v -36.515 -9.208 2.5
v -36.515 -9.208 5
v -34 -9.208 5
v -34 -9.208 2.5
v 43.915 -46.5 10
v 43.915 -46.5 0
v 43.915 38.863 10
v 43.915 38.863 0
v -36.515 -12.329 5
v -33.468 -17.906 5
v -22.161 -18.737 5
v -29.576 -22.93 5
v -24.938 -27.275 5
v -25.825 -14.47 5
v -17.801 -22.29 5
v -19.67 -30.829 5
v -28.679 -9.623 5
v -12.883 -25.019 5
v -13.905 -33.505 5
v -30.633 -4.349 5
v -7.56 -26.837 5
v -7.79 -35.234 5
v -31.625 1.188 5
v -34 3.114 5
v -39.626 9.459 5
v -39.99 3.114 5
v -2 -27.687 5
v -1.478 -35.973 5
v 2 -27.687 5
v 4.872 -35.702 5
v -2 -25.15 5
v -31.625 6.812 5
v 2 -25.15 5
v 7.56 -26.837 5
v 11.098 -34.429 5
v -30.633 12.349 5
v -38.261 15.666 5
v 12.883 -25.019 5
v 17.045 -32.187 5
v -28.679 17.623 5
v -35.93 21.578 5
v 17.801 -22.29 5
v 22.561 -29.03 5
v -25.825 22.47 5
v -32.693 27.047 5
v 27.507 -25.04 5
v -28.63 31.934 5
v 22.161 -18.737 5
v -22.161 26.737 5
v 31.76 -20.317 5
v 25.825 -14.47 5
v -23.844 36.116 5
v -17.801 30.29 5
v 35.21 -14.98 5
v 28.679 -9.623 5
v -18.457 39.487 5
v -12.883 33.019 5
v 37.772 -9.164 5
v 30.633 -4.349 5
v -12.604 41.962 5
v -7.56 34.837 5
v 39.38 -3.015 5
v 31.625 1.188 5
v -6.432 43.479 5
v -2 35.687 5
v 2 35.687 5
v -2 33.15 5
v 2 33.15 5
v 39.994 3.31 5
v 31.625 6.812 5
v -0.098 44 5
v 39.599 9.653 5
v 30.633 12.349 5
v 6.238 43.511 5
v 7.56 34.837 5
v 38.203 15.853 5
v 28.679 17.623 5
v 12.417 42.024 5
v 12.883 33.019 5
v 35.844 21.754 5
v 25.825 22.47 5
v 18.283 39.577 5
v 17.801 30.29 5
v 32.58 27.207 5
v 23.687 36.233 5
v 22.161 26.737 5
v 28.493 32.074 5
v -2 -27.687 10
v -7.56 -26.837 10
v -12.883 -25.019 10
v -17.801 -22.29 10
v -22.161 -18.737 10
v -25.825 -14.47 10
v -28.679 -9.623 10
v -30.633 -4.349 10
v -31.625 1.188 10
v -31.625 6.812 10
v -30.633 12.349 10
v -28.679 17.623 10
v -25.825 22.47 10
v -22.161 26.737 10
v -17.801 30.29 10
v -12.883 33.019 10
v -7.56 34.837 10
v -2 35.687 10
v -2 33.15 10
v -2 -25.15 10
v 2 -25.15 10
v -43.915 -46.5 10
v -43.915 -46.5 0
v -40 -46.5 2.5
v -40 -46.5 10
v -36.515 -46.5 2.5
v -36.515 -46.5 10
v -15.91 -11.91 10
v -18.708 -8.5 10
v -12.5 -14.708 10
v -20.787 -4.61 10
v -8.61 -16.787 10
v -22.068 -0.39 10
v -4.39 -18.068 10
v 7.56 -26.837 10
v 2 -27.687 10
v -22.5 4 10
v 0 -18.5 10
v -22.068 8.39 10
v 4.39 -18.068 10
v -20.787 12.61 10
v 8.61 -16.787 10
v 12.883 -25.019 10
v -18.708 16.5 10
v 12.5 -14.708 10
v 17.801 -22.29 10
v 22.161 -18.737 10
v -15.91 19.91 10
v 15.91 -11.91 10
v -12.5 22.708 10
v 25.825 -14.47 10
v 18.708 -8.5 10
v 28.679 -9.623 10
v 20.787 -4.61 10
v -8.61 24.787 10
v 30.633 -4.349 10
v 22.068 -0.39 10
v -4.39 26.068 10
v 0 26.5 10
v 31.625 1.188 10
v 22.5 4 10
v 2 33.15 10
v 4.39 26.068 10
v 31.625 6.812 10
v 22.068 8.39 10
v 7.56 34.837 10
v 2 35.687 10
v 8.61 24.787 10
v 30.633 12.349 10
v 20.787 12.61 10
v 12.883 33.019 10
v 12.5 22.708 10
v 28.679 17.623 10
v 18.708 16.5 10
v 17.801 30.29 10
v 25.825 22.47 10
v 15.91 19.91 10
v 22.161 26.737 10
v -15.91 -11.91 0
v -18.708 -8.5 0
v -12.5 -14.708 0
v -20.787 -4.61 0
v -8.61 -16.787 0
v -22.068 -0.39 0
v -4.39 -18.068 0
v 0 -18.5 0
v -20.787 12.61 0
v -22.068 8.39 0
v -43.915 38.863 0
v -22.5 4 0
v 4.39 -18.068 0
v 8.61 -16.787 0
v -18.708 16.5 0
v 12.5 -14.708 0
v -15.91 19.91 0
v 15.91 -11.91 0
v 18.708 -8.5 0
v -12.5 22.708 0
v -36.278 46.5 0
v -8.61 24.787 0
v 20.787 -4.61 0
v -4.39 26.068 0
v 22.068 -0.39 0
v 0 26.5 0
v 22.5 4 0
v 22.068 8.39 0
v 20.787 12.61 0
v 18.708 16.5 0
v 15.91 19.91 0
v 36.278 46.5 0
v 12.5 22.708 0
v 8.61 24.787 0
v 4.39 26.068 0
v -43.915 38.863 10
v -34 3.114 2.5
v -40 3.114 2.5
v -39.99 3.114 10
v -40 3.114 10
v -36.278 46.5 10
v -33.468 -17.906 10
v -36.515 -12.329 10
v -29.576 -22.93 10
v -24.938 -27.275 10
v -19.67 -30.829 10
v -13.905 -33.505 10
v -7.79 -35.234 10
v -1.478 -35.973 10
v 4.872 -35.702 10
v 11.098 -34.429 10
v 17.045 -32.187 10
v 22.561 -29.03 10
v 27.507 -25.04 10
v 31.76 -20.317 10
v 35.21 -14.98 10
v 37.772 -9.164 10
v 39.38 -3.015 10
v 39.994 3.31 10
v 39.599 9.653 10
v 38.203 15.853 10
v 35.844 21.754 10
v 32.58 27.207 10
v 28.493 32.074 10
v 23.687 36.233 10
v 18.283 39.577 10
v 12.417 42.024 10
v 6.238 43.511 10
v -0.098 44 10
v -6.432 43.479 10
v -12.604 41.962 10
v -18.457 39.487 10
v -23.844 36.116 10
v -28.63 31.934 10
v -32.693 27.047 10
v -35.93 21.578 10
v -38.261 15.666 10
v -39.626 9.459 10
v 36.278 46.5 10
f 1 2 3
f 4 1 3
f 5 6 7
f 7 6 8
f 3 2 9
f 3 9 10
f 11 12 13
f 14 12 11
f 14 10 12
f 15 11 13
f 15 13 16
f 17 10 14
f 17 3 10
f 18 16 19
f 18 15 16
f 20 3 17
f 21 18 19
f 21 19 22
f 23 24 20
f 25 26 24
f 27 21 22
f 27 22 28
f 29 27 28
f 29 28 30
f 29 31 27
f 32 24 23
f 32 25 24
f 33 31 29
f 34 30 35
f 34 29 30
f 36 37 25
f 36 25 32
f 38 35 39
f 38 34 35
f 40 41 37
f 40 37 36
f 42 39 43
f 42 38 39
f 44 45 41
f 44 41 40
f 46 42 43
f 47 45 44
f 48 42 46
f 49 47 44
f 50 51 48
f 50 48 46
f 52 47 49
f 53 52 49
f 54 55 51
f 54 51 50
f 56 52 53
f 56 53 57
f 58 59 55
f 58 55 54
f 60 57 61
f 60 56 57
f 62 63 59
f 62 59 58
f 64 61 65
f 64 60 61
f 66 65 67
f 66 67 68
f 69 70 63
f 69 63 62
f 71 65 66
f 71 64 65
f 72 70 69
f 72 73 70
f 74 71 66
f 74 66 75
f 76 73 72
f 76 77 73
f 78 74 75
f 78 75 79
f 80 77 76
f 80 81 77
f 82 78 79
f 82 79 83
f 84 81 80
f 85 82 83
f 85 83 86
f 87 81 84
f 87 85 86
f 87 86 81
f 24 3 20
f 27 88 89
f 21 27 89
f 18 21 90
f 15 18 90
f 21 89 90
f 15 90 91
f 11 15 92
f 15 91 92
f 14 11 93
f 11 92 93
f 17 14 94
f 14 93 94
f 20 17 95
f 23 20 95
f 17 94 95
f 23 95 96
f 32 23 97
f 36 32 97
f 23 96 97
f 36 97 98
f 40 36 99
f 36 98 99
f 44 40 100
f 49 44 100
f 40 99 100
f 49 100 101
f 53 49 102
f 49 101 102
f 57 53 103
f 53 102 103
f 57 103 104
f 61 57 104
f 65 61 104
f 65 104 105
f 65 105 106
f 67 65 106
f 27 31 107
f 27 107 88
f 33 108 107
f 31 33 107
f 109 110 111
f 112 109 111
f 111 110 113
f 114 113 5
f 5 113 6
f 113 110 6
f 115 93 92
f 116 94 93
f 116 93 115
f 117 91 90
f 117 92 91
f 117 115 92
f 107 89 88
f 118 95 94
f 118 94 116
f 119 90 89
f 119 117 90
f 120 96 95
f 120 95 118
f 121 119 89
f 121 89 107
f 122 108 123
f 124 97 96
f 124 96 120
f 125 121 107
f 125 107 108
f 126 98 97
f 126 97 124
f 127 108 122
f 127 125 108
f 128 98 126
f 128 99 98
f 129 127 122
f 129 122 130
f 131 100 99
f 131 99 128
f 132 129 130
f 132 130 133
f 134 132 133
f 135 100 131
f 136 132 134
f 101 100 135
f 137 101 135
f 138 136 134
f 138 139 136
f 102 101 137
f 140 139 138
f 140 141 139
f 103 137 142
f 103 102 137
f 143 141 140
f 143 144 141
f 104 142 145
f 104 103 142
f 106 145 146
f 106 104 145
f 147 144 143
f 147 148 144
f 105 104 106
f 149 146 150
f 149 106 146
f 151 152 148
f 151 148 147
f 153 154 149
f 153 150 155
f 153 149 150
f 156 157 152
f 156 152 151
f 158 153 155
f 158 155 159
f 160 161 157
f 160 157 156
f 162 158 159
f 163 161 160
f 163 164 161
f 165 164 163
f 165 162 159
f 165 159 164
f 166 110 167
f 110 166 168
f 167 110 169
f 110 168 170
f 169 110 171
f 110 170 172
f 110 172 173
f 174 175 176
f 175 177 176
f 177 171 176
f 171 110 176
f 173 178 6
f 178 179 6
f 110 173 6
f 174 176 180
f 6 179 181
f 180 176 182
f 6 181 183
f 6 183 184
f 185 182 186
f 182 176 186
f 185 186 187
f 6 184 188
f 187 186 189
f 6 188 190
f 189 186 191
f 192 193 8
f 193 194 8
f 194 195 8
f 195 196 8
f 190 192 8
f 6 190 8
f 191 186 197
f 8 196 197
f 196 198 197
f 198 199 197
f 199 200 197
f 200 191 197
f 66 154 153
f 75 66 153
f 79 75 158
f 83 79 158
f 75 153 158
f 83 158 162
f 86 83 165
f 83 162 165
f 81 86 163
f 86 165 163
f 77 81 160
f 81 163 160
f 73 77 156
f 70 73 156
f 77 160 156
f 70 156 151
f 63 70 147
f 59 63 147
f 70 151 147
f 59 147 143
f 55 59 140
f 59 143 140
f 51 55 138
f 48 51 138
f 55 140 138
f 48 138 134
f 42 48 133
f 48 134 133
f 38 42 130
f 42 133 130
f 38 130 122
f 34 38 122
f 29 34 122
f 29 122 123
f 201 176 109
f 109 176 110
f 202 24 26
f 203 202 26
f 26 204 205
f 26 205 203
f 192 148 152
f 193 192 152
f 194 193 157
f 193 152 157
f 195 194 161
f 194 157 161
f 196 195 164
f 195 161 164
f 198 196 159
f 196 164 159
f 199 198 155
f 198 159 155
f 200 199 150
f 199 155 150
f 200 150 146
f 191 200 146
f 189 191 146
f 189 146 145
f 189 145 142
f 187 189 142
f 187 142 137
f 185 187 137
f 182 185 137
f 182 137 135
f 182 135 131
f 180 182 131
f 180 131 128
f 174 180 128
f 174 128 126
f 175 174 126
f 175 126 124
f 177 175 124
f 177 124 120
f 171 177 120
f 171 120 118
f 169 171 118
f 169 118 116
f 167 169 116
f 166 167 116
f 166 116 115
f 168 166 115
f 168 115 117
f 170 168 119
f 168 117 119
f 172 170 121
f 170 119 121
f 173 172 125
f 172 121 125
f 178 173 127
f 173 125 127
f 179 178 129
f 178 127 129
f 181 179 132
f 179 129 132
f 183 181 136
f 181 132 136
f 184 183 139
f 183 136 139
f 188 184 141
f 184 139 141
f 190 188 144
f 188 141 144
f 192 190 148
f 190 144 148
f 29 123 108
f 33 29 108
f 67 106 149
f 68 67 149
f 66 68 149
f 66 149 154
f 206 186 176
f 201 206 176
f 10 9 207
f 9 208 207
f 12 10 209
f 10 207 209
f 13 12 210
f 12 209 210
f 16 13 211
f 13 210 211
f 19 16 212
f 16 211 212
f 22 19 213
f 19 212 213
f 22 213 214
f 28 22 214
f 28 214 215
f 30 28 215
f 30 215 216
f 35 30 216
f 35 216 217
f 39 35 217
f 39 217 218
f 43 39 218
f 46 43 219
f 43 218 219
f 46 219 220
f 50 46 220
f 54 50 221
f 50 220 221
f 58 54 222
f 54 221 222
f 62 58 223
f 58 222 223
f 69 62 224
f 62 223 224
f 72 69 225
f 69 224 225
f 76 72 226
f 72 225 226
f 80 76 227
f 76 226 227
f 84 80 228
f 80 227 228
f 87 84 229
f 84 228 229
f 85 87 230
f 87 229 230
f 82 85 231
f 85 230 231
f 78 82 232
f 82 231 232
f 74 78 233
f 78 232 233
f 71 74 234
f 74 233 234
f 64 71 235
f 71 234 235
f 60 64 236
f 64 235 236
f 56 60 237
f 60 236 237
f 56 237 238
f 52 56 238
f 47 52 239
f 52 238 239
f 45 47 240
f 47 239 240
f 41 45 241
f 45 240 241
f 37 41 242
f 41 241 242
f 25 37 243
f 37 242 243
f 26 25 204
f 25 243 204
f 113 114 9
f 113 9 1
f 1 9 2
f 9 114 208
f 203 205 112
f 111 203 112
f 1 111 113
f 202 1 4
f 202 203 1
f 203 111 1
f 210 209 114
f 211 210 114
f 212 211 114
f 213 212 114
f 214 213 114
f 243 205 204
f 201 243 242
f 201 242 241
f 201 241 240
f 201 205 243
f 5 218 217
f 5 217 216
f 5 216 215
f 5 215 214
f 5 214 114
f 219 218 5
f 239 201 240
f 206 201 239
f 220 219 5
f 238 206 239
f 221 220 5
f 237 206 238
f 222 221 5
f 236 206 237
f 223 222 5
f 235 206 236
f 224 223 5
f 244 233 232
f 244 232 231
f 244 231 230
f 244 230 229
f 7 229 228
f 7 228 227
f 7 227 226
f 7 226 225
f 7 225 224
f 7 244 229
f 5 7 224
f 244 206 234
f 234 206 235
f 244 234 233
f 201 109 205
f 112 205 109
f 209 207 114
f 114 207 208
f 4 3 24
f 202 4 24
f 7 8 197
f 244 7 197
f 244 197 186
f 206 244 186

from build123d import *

# Parameters (mm, degrees)
F1_DEPTH = 10
F4_DEPTH = 7.5
F2_R     = 22.5
F5_DEPTH = 10.001
F2_R_2   = 40
F6_DEPTH = 5


with BuildPart() as f1:
    # F0 (on Top) → F1 (new body)
    with BuildSketch(Plane.XY):
        Polygon((43.915, 38.863247), (36.278247, 46.5), (-36.278247, 46.5), (-43.915, 38.863247), (-43.915, -46.5), (43.915, -46.5), align=None)
    extrude(amount=F1_DEPTH)

    # F3 (on face) → F4 (cut)
    with BuildSketch(Plane.XY.offset(10)):
        Polygon((-40, 3.114054), (-40, -46.500151), (-36.5154, -46.500151), (-36.5154, -9.207999), (-34, -9.207999), (-34, 3.114054), align=None)
    extrude(amount=-F4_DEPTH, mode=Mode.SUBTRACT)

    # F2 (on face) → F5 (cut, through all)
    with BuildSketch(Plane.XY.offset(10)):
        with Locations((0, 4)):
            Circle(F2_R)
    extrude(amount=-F5_DEPTH, mode=Mode.SUBTRACT)

    # F2 (on face) → F6 (cut)
    with BuildSketch(Plane.XY.offset(10)):
        with Locations((0, 4)):
            Circle(F2_R_2)
        with BuildLine():
            ThreePointArc((2, 35.686945), (31.75, 4), (2, -27.686945))
            Line((2, -27.686945), (2, -25.15))
            Line((2, -25.15), (-2, -25.15))
            Line((-2, -25.15), (-2, -27.686945))
            ThreePointArc((-2, -27.686945), (-31.75, 4), (-2, 35.686945))
            Line((-2, 35.686945), (-2, 33.15))
            Line((-2, 33.15), (2, 33.15))
            Line((2, 33.15), (2, 35.686945))
        make_face(mode=Mode.SUBTRACT)
    extrude(amount=-F6_DEPTH, mode=Mode.SUBTRACT)


solid = f1.part
